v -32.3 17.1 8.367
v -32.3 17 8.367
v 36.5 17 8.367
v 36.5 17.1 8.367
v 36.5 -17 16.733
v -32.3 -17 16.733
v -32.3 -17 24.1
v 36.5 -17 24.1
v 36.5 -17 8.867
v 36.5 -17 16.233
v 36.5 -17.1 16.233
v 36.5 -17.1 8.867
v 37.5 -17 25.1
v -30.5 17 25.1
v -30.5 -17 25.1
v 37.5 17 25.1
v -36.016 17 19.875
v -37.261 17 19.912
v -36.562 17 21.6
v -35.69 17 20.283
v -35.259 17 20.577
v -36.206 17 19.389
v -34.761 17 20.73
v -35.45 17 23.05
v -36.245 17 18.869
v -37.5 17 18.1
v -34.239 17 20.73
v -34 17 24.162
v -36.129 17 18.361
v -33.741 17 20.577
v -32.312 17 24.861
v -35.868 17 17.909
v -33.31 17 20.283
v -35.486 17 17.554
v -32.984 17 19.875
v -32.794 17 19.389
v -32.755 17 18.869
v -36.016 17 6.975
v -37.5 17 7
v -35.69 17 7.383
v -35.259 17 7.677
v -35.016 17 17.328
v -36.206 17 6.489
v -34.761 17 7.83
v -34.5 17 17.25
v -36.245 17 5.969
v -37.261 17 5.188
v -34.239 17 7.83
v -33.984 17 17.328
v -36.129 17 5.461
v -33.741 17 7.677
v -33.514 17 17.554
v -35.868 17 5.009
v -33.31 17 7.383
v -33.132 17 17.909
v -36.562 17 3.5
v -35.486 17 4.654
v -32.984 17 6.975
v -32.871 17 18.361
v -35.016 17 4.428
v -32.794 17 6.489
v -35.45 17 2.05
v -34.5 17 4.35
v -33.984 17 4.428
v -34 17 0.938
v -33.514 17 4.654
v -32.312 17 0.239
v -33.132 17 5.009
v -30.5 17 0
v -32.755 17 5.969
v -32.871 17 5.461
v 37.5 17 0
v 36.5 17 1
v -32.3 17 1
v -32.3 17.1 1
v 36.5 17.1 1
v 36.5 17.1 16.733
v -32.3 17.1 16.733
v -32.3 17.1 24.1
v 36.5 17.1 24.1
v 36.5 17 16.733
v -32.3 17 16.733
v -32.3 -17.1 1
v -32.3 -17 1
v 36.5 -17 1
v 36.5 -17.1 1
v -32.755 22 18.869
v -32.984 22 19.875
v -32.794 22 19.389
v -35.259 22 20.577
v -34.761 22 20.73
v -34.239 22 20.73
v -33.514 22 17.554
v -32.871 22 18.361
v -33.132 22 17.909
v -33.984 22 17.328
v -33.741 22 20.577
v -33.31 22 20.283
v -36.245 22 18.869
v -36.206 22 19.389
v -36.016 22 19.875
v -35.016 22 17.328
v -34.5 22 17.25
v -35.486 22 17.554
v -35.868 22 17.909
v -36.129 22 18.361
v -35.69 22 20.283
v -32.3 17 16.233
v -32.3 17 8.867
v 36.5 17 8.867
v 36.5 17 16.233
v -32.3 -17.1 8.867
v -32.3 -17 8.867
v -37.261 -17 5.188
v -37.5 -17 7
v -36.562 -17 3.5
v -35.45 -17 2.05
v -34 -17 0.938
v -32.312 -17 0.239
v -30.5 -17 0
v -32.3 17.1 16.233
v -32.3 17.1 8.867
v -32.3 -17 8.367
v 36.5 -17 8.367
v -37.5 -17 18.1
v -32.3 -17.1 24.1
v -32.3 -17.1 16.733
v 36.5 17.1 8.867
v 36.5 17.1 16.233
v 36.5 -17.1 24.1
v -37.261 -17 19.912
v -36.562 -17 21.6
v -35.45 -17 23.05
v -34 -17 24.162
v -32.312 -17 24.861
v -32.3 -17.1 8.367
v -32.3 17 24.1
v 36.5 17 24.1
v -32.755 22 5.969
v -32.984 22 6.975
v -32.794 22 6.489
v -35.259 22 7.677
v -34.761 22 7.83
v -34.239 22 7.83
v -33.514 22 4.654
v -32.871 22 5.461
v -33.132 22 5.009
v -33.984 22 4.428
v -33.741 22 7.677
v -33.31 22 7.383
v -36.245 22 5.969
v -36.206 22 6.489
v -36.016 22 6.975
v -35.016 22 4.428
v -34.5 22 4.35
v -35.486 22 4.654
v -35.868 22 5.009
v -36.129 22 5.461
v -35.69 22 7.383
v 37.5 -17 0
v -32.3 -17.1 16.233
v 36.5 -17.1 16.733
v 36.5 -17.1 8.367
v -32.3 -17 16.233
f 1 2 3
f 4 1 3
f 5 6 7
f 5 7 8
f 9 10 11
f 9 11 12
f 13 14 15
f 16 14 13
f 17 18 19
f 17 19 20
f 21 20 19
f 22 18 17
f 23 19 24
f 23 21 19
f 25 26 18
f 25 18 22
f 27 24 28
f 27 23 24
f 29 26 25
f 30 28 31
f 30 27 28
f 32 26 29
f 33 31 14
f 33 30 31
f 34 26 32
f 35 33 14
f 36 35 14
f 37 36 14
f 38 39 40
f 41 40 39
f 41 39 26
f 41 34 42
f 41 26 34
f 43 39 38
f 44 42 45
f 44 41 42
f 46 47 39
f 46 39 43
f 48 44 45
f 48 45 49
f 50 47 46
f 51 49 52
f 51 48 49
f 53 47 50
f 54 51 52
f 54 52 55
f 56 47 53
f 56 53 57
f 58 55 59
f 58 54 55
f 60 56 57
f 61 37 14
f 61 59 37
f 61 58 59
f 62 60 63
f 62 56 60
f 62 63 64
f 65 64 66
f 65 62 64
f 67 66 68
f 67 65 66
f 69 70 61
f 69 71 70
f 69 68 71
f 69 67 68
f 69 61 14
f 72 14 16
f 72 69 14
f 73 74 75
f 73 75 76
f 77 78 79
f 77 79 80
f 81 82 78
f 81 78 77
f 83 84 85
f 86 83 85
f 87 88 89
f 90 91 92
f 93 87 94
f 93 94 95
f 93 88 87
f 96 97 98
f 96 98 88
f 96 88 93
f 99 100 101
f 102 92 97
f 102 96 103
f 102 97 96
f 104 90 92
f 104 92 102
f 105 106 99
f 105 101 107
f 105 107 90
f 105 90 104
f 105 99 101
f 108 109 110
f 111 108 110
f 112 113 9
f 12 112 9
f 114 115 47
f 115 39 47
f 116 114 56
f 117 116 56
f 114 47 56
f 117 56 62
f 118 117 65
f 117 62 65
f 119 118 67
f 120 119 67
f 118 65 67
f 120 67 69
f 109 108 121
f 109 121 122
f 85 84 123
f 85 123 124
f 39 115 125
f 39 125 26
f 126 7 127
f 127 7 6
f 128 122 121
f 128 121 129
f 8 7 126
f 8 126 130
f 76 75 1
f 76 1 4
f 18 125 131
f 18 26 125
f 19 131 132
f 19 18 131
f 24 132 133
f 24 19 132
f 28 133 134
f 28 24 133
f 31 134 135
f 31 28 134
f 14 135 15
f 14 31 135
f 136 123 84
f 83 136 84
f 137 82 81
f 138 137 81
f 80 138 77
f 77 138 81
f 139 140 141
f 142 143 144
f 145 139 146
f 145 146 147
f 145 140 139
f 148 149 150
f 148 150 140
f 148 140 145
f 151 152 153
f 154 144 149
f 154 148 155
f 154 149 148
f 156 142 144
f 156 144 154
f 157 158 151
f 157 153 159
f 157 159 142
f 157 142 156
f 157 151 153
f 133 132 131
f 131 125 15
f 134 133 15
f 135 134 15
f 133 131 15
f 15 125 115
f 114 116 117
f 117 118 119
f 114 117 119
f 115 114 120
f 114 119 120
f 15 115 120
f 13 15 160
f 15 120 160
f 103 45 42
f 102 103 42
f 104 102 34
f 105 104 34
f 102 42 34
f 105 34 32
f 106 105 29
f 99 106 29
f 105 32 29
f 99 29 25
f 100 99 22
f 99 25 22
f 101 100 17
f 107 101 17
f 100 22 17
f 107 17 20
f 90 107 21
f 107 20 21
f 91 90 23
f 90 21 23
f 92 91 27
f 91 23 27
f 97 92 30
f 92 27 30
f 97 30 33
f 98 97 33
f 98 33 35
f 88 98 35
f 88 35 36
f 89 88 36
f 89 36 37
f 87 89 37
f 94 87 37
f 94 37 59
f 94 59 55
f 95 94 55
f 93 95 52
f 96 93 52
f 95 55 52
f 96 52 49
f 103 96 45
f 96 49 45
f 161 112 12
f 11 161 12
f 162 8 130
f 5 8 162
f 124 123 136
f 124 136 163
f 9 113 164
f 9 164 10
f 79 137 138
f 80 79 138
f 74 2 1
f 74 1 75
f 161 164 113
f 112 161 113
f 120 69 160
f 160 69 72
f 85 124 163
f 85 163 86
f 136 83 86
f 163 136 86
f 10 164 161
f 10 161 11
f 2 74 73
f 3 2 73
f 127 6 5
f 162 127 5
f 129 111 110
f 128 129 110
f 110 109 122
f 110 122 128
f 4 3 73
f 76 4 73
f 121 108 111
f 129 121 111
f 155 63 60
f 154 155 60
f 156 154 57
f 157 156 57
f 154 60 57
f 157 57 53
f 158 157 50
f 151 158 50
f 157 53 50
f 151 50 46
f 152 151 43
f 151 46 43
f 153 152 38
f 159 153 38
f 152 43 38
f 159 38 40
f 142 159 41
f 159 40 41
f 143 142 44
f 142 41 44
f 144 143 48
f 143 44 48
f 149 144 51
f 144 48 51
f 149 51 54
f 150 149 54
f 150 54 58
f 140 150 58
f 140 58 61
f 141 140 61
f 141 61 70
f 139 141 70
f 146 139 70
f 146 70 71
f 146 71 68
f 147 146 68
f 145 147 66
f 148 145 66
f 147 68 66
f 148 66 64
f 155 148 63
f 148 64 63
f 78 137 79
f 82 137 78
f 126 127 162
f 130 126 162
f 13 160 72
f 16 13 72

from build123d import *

# Parameters (mm, degrees)
SKETCH1_W             = 75
SKETCH1_H             = 34
BOSS_EXTRUDE1_DEPTH   = 25.1
FILLET1_R             = 7
SKETCH2_W             = 68.8
SKETCH2_H             = 7.366666667
BOSS_EXTRUDE2_DEPTH   = 0.1
SKETCH2_H_2           = 7.366666666
BOSS_EXTRUDE2_2_DEPTH = 0.1
BOSS_EXTRUDE2_3_DEPTH = 0.1
SKETCH3_R             = 1.75
BOSS_EXTRUDE3_DEPTH   = 5


with BuildPart() as part:
    # Sketch1 → Boss-Extrude1 (new body)
    with BuildSketch(Plane.XY):
        Rectangle(SKETCH1_W, SKETCH1_H)
    extrude(amount=BOSS_EXTRUDE1_DEPTH)

    # Fillet1
    fillet1_edges = [part.edges().sort_by_distance(p)[0] for p in [
        (-37.5, 0, 25.1),
        (-37.5, 0, 0),
    ]]
    fillet(fillet1_edges, radius=FILLET1_R)

    # Sketch3 → Boss-Extrude3 (add)
    with BuildSketch(Plane(origin=(0, 17, 0), x_dir=(1, 0, 0), z_dir=(0, 1, 0))):
        with Locations(Location((-34.5, -6.1, 0), (0, 0, 90))):
            Circle(SKETCH3_R)
        with Locations(Location((-34.5, -19, 0), (0, 0, 90))):
            Circle(SKETCH3_R)
    extrude(amount=BOSS_EXTRUDE3_DEPTH)


with BuildPart() as body_2:
    # Sketch2 → Boss-Extrude2 (new body)
    with BuildSketch(Plane(origin=(0, 17, 0), x_dir=(1, 0, 0), z_dir=(0, 1, 0))):
        with Locations((2.1, -4.683333334)):
            Rectangle(SKETCH2_W, SKETCH2_H)
    extrude(amount=BOSS_EXTRUDE2_DEPTH)


with BuildPart() as body_3:
    # Sketch2 → Boss-Extrude2 2 (new body)
    with BuildSketch(Plane(origin=(0, 17, 0), x_dir=(1, 0, 0), z_dir=(0, 1, 0))):
        with Locations((2.1, -12.55)):
            Rectangle(SKETCH2_W, SKETCH2_H_2)
    extrude(amount=BOSS_EXTRUDE2_2_DEPTH)


with BuildPart() as body_4:
    # Sketch2 → Boss-Extrude2 3 (new body)
    with BuildSketch(Plane(origin=(0, 17, 0), x_dir=(1, 0, 0), z_dir=(0, 1, 0))):
        with Locations((2.1, -20.416666666)):
            Rectangle(SKETCH2_W, SKETCH2_H)
    extrude(amount=BOSS_EXTRUDE2_3_DEPTH)


with BuildPart() as body_5:
    # Mirror1: mirrored copy
    add(body_4.part.mirror(Plane.ZX))


with BuildPart() as body_6:
    # Mirror1 2: mirrored copy
    add(body_3.part.mirror(Plane.ZX))


with BuildPart() as body_7:
    # Mirror1 3: mirrored copy
    add(body_2.part.mirror(Plane.ZX))


solid = Compound([part.part, body_2.part, body_3.part, body_4.part, body_5.part, body_6.part, body_7.part])
